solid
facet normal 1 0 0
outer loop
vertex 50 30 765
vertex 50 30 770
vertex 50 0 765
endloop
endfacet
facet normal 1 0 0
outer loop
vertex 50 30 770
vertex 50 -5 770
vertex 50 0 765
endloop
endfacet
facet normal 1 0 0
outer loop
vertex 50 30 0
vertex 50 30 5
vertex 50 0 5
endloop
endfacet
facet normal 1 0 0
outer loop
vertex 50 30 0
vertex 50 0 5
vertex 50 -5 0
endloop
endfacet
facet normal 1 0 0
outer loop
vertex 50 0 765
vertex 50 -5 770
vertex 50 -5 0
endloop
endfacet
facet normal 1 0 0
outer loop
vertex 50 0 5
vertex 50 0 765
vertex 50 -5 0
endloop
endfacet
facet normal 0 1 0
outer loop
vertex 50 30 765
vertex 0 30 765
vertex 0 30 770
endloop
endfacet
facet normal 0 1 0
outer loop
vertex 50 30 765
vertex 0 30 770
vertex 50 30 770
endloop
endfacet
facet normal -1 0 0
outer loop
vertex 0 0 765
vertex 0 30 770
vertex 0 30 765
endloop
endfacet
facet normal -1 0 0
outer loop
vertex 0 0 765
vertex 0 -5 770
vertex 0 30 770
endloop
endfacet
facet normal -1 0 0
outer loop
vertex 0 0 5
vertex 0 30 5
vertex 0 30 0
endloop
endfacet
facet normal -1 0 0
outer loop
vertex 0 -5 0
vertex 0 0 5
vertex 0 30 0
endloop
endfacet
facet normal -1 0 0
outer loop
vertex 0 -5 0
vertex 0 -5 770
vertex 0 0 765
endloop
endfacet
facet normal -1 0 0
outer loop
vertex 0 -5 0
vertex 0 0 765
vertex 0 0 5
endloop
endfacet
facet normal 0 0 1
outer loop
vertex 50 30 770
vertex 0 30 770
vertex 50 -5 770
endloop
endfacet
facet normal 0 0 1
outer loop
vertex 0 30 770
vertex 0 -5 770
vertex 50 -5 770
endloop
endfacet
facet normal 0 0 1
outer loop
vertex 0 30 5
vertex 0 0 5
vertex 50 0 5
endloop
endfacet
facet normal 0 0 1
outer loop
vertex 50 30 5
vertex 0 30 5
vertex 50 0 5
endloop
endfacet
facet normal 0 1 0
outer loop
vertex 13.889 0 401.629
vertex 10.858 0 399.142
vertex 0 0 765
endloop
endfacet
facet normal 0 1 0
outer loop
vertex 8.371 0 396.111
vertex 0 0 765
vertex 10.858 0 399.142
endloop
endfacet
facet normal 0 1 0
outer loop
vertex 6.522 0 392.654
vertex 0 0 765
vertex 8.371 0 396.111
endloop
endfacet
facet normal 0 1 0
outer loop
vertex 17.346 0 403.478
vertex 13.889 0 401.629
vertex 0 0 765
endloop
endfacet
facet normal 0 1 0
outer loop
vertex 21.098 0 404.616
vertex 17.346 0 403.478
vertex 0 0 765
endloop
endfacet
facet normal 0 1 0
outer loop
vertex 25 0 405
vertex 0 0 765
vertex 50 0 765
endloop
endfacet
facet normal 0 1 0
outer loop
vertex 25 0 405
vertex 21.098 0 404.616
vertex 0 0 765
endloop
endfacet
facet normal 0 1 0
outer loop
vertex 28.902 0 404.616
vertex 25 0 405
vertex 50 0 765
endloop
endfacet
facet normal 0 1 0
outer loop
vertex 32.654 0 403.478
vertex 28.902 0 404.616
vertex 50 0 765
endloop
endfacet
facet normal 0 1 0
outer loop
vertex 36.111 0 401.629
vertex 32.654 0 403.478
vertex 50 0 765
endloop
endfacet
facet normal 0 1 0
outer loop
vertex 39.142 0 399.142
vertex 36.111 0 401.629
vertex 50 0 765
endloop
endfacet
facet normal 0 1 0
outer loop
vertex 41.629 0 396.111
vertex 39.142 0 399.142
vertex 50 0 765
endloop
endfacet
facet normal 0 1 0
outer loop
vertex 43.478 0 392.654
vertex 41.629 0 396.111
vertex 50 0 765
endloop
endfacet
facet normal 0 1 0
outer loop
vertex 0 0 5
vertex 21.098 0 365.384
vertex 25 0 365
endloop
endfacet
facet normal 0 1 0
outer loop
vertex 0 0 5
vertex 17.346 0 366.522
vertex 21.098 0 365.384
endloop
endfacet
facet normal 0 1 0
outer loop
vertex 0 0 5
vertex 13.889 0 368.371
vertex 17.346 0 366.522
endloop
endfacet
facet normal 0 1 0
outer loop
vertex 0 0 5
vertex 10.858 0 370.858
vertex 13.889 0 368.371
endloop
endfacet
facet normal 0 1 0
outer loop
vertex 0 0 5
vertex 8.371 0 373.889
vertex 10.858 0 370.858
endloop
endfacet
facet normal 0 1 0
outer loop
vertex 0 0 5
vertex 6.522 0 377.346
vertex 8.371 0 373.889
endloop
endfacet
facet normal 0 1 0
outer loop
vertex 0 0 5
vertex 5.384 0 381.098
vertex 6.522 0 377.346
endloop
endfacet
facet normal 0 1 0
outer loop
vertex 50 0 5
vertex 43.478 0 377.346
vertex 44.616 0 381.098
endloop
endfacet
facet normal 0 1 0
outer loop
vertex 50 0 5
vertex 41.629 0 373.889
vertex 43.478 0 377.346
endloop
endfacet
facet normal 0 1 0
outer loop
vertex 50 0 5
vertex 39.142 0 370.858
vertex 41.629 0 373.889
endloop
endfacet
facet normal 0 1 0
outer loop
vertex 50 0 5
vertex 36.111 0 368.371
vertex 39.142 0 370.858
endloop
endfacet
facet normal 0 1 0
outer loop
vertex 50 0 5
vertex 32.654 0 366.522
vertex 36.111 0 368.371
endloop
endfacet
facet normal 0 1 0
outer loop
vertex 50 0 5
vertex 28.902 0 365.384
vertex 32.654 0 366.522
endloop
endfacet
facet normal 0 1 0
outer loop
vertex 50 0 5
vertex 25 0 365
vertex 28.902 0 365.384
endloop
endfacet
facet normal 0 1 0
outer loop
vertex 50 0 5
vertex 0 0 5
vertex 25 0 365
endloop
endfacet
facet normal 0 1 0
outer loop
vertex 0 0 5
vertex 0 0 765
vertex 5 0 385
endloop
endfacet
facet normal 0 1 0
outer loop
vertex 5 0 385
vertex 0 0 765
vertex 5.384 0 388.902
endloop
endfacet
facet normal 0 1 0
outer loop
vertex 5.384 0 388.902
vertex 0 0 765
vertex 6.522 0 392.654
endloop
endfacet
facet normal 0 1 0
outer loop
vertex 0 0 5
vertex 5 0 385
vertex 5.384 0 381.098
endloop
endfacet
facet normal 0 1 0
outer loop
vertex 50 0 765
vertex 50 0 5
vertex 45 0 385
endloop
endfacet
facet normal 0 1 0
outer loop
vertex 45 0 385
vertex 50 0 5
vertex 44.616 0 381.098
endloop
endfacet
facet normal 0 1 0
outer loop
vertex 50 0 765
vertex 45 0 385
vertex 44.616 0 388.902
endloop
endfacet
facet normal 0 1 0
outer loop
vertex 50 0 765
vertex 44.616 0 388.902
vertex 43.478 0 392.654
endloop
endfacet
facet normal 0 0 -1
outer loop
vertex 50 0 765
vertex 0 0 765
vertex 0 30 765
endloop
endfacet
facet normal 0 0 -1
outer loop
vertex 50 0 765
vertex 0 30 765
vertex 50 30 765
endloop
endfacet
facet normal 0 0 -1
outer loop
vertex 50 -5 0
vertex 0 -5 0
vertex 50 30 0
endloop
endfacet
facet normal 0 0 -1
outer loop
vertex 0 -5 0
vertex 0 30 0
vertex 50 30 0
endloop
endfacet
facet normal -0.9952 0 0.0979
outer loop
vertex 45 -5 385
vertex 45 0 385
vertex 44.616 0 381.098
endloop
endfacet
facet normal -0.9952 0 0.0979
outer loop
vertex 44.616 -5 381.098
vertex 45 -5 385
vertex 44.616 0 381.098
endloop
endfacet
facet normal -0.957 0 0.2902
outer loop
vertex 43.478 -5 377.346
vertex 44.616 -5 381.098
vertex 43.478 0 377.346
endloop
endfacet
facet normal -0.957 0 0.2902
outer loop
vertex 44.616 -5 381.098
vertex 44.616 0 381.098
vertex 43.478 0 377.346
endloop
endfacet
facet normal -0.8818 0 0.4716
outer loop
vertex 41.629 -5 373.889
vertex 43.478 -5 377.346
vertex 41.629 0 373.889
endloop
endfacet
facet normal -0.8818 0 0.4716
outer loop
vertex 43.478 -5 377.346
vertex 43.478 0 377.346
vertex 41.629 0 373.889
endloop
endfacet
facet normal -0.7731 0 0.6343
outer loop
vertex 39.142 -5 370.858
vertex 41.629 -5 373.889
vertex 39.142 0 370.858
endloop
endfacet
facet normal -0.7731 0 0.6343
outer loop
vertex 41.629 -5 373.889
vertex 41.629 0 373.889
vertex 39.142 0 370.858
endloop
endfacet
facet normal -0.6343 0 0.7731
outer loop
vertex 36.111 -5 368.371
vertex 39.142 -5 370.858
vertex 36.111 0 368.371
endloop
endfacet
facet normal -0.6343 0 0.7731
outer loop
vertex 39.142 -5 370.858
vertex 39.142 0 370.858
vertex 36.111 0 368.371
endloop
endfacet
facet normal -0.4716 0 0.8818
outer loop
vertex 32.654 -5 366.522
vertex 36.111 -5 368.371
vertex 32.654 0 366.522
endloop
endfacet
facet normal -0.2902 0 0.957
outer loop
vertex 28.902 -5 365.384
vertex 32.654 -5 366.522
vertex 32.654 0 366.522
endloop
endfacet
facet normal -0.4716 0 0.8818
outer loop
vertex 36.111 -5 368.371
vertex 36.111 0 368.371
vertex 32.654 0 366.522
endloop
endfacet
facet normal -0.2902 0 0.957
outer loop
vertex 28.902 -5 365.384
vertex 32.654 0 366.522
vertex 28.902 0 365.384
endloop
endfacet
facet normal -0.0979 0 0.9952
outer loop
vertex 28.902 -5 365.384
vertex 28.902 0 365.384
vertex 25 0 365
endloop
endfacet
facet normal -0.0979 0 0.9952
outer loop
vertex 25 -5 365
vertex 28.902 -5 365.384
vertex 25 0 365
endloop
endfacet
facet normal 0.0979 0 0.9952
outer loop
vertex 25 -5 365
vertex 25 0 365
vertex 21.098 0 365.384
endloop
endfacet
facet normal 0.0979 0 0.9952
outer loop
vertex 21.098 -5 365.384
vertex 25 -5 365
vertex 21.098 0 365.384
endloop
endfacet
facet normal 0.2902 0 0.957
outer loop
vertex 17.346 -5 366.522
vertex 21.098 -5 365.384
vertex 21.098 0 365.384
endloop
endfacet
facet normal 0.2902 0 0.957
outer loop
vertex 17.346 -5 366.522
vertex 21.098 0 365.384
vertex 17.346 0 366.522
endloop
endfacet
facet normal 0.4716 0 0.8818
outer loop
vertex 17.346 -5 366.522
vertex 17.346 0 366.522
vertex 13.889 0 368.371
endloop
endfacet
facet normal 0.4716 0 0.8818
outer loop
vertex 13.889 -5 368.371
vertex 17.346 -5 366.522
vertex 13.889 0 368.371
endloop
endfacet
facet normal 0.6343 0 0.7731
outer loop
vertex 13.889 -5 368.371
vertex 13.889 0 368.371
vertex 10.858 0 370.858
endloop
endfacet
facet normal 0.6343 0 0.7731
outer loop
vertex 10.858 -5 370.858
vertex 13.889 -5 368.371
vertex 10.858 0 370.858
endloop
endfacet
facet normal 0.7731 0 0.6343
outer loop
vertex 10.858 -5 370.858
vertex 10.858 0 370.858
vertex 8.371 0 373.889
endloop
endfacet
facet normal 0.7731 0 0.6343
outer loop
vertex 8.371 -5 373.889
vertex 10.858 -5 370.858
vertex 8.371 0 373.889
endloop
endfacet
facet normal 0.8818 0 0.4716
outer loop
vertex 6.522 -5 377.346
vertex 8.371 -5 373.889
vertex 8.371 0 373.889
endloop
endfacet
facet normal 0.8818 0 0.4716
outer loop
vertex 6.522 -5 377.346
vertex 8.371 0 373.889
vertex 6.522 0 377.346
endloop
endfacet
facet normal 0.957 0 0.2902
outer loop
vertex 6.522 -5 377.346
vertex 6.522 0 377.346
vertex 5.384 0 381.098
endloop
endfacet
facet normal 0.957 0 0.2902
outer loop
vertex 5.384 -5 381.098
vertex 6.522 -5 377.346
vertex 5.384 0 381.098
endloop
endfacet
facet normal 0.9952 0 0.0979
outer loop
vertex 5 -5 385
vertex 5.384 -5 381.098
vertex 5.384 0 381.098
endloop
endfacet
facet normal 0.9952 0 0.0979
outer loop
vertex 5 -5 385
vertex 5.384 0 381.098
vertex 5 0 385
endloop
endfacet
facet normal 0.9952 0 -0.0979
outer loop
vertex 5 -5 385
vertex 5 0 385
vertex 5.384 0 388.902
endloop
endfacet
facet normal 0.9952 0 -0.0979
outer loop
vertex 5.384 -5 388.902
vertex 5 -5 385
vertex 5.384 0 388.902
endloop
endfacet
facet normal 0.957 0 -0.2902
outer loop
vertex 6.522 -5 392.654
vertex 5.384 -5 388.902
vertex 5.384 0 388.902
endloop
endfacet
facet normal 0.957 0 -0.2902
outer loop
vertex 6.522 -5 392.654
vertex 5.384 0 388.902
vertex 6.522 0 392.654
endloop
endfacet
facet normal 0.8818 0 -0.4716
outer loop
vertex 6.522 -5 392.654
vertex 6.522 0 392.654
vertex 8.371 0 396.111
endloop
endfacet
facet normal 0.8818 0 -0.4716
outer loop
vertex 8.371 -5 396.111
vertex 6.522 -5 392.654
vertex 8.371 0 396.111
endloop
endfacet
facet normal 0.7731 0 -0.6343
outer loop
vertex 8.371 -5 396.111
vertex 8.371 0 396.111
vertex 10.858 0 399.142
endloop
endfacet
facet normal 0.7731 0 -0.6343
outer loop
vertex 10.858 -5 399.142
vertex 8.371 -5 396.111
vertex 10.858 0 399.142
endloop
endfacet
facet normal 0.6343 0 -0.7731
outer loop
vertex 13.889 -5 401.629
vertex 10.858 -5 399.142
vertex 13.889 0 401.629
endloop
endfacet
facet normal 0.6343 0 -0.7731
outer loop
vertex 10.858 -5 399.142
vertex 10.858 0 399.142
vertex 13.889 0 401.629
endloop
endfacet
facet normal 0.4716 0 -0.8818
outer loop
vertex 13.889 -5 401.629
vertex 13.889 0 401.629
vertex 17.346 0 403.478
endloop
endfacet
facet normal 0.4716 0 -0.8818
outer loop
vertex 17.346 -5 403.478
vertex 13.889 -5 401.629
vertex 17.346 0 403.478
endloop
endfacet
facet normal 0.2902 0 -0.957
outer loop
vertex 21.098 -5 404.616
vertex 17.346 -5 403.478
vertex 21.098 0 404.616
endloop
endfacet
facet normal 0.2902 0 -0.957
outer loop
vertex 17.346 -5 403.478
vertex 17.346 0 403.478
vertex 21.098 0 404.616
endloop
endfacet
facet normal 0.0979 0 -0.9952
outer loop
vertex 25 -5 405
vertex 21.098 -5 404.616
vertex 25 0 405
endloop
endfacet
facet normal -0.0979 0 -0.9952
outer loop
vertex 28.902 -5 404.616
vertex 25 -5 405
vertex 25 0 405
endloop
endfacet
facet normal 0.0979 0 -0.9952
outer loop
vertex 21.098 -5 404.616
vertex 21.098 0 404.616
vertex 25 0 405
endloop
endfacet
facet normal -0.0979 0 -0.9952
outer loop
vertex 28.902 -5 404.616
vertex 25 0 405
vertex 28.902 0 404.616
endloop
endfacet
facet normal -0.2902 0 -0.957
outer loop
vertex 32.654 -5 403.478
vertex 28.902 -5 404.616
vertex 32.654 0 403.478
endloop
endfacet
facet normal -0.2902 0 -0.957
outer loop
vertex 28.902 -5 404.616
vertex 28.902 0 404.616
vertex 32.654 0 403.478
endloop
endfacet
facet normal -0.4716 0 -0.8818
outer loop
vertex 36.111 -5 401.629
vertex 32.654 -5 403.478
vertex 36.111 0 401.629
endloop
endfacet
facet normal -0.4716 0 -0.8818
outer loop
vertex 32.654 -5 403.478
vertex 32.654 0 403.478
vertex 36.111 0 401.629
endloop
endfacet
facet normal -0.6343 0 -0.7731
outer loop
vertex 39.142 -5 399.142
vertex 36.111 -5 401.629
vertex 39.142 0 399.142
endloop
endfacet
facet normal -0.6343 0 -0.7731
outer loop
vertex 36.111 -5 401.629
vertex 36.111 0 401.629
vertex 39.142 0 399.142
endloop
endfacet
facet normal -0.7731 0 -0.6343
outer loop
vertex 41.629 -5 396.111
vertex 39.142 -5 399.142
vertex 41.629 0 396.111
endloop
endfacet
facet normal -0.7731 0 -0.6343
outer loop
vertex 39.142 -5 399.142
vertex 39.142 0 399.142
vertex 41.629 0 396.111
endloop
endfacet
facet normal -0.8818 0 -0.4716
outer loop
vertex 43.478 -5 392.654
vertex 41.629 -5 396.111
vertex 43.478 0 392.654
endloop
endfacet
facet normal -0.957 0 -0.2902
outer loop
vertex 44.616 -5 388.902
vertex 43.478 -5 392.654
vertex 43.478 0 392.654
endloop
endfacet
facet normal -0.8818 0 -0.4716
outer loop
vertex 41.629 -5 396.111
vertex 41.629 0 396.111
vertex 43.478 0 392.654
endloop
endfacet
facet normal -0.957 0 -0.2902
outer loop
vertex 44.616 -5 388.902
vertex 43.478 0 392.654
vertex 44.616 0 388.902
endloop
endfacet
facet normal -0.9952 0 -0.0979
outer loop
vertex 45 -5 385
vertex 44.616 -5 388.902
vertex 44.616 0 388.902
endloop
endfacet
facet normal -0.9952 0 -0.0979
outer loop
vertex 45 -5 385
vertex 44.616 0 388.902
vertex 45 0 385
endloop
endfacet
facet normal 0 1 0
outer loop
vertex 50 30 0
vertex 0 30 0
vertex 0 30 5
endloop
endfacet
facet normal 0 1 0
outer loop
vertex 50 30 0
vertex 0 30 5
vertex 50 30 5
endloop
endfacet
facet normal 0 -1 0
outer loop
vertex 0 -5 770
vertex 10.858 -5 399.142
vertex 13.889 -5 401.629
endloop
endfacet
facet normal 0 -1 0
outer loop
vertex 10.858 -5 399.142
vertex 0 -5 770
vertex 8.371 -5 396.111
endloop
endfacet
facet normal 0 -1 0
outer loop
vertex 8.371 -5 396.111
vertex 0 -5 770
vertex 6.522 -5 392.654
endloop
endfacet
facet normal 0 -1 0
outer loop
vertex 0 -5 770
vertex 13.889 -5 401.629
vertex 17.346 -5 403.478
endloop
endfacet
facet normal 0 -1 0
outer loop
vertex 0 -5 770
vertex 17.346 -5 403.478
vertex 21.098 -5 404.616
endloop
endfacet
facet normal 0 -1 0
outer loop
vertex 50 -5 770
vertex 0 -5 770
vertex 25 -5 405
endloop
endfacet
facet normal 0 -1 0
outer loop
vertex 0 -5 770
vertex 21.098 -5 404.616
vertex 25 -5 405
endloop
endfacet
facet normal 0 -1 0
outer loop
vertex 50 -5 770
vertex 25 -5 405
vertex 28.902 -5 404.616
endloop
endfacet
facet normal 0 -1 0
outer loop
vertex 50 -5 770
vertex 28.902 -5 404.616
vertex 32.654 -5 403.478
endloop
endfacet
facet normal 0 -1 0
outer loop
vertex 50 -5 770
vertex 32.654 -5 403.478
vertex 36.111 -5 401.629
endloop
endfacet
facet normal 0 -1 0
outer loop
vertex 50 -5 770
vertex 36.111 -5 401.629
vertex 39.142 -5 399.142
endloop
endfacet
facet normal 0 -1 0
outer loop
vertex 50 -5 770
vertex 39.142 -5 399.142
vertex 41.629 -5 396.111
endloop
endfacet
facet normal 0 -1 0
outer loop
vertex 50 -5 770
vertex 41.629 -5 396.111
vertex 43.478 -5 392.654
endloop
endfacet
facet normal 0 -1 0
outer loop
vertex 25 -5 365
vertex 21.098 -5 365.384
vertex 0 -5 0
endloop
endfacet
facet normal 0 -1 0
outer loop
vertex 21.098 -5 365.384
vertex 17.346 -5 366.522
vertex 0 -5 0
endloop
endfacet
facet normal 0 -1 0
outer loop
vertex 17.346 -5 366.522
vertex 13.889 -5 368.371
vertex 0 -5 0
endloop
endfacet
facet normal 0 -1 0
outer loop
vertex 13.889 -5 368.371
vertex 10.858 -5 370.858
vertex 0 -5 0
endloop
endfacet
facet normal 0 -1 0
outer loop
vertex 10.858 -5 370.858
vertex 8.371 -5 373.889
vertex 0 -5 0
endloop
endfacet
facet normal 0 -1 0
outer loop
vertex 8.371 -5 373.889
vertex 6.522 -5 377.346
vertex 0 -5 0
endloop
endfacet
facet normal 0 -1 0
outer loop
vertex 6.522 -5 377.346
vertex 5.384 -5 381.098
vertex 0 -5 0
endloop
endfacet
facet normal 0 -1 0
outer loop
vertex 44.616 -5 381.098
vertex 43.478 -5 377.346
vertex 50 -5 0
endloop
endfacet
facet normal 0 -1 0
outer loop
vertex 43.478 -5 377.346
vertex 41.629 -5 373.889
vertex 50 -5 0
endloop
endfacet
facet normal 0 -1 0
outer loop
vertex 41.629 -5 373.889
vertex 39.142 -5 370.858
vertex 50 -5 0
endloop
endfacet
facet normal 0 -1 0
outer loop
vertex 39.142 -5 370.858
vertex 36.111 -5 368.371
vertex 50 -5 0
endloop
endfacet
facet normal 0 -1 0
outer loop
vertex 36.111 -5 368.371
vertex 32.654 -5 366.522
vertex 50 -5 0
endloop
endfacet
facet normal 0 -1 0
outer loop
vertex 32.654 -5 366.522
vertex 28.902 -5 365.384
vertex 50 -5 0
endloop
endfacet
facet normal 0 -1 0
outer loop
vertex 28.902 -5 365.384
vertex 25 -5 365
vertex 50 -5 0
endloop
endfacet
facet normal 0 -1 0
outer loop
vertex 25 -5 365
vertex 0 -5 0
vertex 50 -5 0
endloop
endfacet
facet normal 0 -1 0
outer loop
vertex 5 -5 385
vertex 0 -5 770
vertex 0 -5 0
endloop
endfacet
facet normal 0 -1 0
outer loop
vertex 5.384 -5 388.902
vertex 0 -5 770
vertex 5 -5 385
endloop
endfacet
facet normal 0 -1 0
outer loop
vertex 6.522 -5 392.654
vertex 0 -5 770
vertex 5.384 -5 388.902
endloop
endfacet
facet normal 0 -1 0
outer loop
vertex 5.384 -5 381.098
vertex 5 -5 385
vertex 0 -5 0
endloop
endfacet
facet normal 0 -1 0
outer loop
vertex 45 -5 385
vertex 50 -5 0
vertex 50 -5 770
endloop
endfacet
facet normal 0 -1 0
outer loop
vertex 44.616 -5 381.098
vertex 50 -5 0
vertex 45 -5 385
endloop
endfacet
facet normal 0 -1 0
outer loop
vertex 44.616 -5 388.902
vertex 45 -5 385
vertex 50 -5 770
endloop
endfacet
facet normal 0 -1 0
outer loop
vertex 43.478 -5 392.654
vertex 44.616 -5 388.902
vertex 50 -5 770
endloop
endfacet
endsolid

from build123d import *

# Parameters (mm, degrees)
SKETCH2_W           = 50
SKETCH2_H           = 5
BOSS_EXTRUDE1_DEPTH = 770
SKETCH3_W           = 50
SKETCH3_H           = 5
BOSS_EXTRUDE2_DEPTH = 30
SKETCH4_R           = 20
CUT_EXTRUDE1_DEPTH  = 30


with BuildPart() as part:
    # Sketch2 → Boss-Extrude1 (new body)
    with BuildSketch(Plane.XY):
        with Locations((25, -2.5)):
            Rectangle(SKETCH2_W, SKETCH2_H)
    extrude(amount=BOSS_EXTRUDE1_DEPTH)

    # Sketch3 → Boss-Extrude2 (add)
    with BuildSketch(Plane(origin=(0, 0, 0), x_dir=(1, 0, 0), z_dir=(0, 1, 0))):
        with Locations((25, -767.5)):
            Rectangle(SKETCH3_W, SKETCH3_H)
        with Locations((25, -2.5)):
            Rectangle(SKETCH3_W, SKETCH3_H)
    extrude(amount=BOSS_EXTRUDE2_DEPTH)

    # Sketch4 → Cut-Extrude1 (cut)
    with BuildSketch(Plane(origin=(0, 0, 0), x_dir=(1, 0, 0), z_dir=(0, 1, 0))):
        with Locations((25, -385)):
            Circle(SKETCH4_R)
    extrude(amount=-CUT_EXTRUDE1_DEPTH, mode=Mode.SUBTRACT)


solid = part.part
